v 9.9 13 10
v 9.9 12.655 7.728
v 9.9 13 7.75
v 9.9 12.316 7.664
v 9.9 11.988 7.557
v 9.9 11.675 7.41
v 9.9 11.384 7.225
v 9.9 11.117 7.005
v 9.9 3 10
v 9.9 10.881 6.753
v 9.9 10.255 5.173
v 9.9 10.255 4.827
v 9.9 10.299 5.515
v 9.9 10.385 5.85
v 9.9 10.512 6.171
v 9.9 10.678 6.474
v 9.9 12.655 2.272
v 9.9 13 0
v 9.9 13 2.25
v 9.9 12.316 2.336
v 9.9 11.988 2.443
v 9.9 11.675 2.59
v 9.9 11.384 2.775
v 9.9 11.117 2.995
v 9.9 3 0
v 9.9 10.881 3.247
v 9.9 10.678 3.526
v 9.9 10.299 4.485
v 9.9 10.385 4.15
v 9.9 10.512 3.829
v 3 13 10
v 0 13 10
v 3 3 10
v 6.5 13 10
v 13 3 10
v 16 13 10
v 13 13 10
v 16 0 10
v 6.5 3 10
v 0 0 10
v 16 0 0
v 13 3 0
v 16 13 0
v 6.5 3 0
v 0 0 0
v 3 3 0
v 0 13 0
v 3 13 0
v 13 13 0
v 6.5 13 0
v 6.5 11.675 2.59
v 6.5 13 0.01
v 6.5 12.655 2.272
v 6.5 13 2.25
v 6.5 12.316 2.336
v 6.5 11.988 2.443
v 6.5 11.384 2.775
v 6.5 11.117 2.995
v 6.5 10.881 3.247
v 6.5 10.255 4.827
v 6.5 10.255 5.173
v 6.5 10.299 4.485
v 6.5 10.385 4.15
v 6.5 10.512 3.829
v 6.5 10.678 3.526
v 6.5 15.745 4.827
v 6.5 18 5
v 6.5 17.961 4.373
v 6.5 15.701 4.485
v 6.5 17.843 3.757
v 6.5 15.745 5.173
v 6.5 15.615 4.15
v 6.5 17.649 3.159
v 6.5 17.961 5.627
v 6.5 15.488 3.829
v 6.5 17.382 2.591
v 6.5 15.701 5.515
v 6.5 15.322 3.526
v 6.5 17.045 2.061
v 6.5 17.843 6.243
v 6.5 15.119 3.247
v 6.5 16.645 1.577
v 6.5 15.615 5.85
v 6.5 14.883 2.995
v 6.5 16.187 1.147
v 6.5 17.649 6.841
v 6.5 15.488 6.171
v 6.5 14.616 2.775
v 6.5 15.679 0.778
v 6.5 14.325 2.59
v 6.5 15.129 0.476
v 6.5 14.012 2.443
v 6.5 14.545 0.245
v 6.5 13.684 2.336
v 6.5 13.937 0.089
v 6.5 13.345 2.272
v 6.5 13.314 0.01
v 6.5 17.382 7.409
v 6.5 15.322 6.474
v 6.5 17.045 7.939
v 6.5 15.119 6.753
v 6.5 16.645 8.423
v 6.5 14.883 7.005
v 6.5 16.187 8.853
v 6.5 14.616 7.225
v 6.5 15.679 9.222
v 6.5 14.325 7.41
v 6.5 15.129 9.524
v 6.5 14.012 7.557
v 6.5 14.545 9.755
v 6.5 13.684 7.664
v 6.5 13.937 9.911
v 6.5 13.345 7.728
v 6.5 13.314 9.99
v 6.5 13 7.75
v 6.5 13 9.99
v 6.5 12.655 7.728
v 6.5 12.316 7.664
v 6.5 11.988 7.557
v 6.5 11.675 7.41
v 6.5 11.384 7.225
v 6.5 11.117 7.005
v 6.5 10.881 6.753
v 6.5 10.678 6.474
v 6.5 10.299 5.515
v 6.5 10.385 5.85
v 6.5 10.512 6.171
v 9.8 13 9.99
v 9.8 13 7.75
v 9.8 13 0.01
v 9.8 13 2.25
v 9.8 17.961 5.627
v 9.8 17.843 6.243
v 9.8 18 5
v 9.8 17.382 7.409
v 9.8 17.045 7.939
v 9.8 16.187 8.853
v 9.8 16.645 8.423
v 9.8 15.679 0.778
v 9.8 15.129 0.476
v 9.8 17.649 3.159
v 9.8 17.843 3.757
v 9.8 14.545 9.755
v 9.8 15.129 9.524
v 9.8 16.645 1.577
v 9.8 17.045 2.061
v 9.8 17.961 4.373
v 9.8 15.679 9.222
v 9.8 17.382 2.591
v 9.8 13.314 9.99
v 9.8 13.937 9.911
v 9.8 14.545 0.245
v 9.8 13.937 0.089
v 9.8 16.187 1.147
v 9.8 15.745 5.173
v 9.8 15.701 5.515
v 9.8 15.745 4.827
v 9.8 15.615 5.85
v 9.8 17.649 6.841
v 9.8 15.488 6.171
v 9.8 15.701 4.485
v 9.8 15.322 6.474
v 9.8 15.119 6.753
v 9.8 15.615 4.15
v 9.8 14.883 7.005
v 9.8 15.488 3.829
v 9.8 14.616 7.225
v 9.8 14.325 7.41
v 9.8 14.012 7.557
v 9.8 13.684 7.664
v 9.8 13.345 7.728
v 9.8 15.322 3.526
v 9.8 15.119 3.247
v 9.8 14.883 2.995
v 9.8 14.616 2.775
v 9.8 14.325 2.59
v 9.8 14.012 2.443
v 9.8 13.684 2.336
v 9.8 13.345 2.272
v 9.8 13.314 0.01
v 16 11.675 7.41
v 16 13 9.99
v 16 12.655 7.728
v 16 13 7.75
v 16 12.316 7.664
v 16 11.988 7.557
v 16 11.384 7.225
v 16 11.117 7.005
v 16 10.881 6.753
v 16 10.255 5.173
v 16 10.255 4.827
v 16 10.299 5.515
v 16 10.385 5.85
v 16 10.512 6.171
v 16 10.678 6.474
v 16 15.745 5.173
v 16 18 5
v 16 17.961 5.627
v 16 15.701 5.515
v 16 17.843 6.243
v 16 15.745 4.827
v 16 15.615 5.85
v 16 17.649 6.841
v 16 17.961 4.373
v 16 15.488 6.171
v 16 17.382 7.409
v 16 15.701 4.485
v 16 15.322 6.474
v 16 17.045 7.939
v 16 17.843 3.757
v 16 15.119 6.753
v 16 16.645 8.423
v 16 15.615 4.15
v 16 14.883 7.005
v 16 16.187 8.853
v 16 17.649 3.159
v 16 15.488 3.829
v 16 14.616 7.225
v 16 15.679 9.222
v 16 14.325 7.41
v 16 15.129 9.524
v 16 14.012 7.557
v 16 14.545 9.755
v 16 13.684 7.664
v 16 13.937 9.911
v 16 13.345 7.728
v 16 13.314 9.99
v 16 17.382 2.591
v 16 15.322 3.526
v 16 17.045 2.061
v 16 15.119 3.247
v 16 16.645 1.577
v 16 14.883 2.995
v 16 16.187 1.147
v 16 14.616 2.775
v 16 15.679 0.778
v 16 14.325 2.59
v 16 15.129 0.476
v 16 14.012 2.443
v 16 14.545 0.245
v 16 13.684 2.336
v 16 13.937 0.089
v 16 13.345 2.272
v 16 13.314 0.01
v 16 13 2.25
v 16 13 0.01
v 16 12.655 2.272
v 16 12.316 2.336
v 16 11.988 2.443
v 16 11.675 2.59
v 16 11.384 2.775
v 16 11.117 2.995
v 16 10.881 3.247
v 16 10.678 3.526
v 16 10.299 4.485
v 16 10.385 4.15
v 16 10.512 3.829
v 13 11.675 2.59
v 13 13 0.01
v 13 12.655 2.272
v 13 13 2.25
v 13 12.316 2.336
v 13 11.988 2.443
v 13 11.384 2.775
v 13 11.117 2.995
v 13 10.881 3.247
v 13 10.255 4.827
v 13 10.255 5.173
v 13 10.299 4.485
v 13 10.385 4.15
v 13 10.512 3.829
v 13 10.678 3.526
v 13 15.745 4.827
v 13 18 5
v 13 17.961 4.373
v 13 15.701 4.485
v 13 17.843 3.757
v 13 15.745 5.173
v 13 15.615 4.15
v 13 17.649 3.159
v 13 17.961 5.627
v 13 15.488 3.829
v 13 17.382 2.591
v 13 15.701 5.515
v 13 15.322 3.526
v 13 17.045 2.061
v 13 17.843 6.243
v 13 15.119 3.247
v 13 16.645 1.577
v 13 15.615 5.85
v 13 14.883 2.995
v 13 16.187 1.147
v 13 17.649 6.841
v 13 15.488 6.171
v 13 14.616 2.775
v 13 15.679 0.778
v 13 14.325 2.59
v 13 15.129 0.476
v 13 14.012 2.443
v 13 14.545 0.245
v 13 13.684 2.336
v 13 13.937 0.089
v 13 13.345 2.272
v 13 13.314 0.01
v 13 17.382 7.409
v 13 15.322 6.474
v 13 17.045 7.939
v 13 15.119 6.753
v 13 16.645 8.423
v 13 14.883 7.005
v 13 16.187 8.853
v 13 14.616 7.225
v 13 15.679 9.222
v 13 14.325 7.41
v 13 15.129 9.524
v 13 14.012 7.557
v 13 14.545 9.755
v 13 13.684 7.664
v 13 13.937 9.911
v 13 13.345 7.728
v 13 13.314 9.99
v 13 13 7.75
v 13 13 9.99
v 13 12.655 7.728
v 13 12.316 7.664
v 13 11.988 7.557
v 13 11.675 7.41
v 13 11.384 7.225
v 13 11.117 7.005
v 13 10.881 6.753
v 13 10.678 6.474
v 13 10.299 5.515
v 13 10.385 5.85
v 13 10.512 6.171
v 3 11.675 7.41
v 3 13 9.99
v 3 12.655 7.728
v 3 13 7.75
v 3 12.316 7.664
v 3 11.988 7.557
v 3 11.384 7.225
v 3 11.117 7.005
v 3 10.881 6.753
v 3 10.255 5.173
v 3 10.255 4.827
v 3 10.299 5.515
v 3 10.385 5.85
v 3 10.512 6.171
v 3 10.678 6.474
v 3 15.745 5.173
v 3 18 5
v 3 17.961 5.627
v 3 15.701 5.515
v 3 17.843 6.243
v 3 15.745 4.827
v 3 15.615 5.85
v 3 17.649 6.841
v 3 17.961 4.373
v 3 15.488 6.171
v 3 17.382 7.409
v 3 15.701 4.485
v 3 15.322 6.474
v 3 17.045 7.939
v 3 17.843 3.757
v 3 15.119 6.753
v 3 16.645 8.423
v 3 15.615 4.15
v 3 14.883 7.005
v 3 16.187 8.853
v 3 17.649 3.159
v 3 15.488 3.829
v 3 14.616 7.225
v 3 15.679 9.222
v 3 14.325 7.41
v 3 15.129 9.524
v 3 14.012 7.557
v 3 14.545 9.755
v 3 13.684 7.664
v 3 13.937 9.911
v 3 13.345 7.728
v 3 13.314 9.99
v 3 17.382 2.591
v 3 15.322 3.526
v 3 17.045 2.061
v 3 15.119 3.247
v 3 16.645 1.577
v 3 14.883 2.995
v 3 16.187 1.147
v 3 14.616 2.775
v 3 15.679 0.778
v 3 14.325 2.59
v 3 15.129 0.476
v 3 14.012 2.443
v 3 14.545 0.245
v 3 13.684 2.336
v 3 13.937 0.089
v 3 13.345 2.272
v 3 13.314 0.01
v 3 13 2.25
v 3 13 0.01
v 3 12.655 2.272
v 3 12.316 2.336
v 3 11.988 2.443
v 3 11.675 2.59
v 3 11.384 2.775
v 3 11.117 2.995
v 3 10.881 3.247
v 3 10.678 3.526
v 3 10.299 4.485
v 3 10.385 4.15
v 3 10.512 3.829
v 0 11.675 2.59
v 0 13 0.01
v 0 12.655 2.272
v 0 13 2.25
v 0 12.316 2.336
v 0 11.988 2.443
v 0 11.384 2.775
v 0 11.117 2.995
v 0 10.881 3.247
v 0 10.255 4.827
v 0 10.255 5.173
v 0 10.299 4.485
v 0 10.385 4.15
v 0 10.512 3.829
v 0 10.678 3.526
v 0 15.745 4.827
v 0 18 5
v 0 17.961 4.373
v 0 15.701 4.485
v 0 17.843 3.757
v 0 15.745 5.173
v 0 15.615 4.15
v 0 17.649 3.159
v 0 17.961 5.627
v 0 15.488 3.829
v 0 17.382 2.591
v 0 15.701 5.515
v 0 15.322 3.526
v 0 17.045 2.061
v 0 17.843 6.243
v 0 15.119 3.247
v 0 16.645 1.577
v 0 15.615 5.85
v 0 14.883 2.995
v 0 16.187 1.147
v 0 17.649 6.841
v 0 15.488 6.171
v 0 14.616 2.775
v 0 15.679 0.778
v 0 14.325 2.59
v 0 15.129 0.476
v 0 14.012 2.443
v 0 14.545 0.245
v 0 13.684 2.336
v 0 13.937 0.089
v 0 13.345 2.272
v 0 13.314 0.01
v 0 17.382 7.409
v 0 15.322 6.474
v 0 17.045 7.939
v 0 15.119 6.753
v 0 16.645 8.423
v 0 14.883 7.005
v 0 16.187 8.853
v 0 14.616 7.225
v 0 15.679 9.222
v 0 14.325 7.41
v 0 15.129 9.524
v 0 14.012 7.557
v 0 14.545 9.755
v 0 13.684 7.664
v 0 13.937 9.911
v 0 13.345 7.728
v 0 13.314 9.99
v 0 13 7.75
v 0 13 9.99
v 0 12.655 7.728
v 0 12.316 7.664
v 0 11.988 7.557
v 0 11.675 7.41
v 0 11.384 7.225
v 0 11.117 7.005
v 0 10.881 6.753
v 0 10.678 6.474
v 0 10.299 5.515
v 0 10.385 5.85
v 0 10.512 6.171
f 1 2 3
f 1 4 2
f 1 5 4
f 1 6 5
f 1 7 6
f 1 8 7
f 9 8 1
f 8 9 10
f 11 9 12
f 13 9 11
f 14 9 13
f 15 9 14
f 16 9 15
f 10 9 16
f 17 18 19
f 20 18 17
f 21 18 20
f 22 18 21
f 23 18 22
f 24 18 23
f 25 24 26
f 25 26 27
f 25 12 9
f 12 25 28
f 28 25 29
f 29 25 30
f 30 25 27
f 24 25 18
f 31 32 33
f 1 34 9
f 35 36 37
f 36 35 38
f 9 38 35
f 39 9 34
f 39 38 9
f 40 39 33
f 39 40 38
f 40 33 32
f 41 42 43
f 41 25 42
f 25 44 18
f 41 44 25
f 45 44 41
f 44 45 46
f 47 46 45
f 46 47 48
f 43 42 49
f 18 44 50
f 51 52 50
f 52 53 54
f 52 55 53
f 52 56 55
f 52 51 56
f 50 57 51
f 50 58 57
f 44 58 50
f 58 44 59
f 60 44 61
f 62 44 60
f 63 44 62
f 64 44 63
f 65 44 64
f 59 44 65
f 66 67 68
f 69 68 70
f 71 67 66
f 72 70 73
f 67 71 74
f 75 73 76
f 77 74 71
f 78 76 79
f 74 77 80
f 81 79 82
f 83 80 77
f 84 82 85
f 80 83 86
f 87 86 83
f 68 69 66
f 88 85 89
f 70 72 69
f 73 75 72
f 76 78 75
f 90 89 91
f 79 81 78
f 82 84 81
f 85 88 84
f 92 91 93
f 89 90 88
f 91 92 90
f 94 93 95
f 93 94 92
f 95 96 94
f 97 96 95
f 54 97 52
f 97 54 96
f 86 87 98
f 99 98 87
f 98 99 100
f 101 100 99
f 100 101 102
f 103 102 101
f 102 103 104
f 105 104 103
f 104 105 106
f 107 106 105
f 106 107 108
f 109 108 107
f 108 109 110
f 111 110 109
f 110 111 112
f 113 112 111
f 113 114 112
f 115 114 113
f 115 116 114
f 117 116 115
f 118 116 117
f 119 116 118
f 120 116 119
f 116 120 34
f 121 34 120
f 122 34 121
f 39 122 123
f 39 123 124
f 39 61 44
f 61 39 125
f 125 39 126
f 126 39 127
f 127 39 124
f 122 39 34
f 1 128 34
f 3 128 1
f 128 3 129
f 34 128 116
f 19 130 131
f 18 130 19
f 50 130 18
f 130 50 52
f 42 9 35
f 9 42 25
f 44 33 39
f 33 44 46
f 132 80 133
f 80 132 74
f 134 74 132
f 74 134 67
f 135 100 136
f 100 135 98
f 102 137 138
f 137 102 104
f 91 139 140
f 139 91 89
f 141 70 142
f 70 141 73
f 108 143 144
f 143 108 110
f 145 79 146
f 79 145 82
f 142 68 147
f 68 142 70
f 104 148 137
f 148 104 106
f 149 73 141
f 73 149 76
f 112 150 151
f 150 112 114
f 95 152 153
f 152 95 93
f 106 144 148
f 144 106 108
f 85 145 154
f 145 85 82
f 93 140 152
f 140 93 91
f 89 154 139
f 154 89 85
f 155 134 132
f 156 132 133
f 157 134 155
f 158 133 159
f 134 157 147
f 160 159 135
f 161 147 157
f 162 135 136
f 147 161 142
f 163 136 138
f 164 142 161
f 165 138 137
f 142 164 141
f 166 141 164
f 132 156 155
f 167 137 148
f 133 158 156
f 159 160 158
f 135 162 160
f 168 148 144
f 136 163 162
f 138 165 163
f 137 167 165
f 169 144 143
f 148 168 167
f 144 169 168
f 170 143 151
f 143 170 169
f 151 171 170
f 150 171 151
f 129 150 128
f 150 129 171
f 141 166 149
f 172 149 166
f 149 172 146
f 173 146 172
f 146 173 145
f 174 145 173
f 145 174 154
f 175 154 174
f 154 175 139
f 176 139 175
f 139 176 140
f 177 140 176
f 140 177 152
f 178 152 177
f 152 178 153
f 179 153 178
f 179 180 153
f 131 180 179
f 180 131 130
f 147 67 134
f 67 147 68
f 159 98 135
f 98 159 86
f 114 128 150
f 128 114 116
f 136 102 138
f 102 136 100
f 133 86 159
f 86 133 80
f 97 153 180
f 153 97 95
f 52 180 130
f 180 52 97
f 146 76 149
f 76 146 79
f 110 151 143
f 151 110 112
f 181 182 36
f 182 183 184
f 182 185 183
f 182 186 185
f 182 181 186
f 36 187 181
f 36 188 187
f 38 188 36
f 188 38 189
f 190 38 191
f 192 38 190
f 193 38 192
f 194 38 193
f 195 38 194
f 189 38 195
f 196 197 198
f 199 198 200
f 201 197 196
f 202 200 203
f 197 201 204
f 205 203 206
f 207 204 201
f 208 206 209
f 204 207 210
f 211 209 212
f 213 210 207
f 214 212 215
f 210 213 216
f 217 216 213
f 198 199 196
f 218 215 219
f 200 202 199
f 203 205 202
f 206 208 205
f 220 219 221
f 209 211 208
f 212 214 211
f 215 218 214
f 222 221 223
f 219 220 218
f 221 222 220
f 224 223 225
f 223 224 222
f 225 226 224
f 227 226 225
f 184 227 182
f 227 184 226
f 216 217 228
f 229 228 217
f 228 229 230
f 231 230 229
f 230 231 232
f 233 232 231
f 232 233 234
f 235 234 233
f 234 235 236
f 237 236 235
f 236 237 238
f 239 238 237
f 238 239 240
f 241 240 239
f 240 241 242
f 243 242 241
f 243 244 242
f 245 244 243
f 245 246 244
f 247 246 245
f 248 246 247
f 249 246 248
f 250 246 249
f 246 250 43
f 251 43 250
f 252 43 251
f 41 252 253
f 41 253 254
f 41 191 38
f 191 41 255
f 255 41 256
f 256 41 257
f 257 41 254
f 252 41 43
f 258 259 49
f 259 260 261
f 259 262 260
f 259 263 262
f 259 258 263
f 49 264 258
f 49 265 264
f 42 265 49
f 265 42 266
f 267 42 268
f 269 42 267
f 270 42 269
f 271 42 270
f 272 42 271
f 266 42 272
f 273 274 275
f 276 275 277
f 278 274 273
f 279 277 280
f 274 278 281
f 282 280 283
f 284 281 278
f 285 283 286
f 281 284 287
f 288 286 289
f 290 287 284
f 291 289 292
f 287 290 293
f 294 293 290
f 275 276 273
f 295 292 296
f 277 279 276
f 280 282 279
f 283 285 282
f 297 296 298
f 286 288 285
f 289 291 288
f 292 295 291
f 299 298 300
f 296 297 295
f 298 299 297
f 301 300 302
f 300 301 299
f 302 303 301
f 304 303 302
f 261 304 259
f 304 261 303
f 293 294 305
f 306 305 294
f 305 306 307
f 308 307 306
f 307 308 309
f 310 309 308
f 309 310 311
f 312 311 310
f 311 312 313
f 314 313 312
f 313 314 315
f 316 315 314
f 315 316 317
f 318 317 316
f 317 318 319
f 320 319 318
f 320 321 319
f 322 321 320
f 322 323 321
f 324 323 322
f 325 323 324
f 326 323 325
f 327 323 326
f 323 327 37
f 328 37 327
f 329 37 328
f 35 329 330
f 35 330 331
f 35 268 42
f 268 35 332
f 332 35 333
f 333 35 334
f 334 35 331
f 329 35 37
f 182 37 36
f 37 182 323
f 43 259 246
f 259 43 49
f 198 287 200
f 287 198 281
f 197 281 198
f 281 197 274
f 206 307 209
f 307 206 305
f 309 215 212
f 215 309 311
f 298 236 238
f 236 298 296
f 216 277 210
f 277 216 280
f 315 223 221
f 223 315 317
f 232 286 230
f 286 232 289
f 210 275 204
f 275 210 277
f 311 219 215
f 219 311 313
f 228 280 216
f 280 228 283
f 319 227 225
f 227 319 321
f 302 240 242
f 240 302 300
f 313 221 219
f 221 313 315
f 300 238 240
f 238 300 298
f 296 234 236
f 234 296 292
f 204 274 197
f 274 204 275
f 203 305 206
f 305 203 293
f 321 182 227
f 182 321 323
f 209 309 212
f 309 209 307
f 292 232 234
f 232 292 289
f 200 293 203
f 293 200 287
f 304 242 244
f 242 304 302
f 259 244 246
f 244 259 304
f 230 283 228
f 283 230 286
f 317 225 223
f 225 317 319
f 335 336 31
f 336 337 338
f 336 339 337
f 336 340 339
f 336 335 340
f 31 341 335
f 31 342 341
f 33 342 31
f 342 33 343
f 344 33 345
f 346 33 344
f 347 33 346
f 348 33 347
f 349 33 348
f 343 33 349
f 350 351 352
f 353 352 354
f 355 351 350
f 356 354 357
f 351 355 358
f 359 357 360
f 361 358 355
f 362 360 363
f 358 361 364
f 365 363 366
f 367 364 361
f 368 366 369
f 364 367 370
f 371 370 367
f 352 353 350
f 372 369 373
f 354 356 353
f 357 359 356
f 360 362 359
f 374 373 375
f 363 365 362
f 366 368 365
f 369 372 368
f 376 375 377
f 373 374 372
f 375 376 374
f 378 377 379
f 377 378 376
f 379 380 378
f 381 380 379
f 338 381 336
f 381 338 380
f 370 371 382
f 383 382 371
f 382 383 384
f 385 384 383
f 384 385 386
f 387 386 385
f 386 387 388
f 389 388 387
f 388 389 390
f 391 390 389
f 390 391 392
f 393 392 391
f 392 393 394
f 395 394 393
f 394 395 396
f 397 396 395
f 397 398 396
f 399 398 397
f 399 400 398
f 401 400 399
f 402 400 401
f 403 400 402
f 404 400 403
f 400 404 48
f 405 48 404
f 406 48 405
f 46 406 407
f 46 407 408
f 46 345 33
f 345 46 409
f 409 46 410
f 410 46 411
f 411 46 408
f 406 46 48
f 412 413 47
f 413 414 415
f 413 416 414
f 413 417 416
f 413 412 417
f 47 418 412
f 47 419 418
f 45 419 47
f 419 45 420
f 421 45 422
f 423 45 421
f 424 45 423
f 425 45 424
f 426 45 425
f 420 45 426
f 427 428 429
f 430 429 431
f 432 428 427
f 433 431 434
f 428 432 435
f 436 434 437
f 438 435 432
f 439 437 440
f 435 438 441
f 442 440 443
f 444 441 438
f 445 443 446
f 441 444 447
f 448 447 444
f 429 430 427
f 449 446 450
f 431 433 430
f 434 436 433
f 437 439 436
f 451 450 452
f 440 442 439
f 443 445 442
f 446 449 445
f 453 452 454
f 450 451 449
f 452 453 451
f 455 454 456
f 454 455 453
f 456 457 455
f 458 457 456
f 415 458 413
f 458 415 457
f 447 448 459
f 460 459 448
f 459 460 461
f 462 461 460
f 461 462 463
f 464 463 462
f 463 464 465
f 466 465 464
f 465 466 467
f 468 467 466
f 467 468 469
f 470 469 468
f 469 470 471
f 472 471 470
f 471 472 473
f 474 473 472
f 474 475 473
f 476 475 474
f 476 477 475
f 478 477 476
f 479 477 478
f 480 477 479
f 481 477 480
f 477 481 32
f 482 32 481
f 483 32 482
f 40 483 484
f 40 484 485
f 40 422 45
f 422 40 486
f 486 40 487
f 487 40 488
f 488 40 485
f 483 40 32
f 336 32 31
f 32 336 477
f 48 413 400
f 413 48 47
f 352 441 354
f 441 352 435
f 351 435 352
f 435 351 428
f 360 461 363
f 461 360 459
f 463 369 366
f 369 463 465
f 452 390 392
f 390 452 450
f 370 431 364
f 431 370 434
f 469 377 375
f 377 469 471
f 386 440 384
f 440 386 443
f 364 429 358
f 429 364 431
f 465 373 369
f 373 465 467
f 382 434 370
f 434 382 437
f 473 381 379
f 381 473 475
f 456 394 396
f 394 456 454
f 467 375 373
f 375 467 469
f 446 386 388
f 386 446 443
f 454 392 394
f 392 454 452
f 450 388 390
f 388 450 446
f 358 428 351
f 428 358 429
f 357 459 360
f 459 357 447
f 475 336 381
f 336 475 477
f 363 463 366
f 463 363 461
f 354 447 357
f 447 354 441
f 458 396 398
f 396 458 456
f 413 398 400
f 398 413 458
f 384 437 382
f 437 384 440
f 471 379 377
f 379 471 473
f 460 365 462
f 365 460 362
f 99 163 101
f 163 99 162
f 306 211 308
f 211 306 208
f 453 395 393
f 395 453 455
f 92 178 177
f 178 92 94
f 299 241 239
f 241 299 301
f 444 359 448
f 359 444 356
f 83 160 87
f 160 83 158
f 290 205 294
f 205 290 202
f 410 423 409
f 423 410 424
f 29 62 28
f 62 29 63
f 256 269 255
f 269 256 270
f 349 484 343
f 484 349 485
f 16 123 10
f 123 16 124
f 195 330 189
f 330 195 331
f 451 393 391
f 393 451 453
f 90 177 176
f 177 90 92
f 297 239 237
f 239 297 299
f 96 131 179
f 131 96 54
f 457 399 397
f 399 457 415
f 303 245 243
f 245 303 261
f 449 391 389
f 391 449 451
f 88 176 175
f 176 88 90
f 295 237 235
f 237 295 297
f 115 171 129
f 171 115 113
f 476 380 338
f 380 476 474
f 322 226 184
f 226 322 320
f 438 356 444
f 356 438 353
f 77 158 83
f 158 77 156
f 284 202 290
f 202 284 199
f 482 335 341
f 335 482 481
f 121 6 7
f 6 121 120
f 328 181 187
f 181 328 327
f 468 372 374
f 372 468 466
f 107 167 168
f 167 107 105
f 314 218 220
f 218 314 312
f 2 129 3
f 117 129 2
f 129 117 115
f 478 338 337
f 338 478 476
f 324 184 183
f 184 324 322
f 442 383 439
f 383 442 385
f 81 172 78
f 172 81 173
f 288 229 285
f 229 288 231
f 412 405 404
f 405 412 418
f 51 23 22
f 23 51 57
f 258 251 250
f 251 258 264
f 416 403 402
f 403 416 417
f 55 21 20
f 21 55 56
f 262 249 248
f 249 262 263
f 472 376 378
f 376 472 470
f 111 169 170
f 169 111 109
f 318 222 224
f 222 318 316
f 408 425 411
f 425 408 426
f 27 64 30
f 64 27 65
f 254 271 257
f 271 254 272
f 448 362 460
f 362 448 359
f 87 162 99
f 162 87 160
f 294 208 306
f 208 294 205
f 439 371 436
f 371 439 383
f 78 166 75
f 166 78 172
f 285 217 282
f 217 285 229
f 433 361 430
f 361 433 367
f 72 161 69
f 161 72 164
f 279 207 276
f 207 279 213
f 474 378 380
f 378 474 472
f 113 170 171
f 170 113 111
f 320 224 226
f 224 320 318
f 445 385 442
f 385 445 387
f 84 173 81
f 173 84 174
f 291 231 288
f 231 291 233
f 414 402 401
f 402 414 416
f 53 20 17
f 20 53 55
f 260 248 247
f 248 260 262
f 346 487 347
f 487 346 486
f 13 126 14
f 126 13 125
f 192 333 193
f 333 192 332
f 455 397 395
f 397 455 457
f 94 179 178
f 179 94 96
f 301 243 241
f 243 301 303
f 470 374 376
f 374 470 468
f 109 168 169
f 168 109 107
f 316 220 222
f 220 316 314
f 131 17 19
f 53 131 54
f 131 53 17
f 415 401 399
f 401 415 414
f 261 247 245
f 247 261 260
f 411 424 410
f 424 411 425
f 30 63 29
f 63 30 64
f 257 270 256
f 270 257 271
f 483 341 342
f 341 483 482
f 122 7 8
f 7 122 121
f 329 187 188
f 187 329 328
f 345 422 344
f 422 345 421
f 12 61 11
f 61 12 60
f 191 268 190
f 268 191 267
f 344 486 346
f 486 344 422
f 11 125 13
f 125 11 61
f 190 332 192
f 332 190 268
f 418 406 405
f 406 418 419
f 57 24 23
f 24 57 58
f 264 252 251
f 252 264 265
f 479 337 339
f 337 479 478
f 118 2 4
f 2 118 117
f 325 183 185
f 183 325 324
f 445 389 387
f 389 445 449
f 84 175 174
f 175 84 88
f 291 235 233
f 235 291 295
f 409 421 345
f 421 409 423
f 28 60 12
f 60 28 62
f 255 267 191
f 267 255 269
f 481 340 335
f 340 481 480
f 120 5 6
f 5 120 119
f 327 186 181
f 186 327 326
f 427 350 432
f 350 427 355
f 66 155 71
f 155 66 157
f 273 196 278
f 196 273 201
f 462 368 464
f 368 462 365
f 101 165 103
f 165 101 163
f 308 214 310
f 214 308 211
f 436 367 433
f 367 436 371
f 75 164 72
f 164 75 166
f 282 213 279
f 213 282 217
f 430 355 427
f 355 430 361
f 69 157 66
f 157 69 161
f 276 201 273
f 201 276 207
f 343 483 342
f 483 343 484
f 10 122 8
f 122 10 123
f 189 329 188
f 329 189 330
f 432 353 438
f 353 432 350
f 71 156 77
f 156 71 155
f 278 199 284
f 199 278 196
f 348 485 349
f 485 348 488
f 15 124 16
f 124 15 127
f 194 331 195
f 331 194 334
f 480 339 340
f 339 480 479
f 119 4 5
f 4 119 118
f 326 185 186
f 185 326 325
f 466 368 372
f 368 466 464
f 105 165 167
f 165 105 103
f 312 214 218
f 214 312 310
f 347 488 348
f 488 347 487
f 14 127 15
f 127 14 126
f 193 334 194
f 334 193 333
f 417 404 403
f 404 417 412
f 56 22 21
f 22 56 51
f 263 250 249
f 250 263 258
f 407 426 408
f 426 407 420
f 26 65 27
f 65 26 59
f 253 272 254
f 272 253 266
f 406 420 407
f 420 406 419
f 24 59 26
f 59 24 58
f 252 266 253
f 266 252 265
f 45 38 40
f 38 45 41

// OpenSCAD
$fn = 50;
bolt_hole_r = 5.5 / 2;
module GoProMount(baseD = 10,baseH = 10)
{
	translate([0,3,0])
	{
		difference()
		{
			union()
			{
				cube([3,baseH,baseD]);
				translate([0,baseH,baseD/2]) rotate([90,0,90]) cylinder(3,baseD/2,baseD/2);
				translate([6.5,0,0])
				{
					cube([3.4,baseH,baseD]);
					translate([0,baseH,baseD/2]) rotate([90,0,90]) cylinder(3.3,baseD/2,baseD/2);
				}
				translate([13,0,0])
				{
					cube([3,baseH,baseD]);
					translate([0,baseH,baseD/2]) rotate([90,0,90]) cylinder(3,baseD/2,baseD/2);
				}
			}
			translate([-7, baseH, baseD/2]) rotate([0,90,0]) cylinder(30, bolt_hole_r, bolt_hole_r);
		}
	}
	cube([16,3,baseD]);
}
GoProMount();
